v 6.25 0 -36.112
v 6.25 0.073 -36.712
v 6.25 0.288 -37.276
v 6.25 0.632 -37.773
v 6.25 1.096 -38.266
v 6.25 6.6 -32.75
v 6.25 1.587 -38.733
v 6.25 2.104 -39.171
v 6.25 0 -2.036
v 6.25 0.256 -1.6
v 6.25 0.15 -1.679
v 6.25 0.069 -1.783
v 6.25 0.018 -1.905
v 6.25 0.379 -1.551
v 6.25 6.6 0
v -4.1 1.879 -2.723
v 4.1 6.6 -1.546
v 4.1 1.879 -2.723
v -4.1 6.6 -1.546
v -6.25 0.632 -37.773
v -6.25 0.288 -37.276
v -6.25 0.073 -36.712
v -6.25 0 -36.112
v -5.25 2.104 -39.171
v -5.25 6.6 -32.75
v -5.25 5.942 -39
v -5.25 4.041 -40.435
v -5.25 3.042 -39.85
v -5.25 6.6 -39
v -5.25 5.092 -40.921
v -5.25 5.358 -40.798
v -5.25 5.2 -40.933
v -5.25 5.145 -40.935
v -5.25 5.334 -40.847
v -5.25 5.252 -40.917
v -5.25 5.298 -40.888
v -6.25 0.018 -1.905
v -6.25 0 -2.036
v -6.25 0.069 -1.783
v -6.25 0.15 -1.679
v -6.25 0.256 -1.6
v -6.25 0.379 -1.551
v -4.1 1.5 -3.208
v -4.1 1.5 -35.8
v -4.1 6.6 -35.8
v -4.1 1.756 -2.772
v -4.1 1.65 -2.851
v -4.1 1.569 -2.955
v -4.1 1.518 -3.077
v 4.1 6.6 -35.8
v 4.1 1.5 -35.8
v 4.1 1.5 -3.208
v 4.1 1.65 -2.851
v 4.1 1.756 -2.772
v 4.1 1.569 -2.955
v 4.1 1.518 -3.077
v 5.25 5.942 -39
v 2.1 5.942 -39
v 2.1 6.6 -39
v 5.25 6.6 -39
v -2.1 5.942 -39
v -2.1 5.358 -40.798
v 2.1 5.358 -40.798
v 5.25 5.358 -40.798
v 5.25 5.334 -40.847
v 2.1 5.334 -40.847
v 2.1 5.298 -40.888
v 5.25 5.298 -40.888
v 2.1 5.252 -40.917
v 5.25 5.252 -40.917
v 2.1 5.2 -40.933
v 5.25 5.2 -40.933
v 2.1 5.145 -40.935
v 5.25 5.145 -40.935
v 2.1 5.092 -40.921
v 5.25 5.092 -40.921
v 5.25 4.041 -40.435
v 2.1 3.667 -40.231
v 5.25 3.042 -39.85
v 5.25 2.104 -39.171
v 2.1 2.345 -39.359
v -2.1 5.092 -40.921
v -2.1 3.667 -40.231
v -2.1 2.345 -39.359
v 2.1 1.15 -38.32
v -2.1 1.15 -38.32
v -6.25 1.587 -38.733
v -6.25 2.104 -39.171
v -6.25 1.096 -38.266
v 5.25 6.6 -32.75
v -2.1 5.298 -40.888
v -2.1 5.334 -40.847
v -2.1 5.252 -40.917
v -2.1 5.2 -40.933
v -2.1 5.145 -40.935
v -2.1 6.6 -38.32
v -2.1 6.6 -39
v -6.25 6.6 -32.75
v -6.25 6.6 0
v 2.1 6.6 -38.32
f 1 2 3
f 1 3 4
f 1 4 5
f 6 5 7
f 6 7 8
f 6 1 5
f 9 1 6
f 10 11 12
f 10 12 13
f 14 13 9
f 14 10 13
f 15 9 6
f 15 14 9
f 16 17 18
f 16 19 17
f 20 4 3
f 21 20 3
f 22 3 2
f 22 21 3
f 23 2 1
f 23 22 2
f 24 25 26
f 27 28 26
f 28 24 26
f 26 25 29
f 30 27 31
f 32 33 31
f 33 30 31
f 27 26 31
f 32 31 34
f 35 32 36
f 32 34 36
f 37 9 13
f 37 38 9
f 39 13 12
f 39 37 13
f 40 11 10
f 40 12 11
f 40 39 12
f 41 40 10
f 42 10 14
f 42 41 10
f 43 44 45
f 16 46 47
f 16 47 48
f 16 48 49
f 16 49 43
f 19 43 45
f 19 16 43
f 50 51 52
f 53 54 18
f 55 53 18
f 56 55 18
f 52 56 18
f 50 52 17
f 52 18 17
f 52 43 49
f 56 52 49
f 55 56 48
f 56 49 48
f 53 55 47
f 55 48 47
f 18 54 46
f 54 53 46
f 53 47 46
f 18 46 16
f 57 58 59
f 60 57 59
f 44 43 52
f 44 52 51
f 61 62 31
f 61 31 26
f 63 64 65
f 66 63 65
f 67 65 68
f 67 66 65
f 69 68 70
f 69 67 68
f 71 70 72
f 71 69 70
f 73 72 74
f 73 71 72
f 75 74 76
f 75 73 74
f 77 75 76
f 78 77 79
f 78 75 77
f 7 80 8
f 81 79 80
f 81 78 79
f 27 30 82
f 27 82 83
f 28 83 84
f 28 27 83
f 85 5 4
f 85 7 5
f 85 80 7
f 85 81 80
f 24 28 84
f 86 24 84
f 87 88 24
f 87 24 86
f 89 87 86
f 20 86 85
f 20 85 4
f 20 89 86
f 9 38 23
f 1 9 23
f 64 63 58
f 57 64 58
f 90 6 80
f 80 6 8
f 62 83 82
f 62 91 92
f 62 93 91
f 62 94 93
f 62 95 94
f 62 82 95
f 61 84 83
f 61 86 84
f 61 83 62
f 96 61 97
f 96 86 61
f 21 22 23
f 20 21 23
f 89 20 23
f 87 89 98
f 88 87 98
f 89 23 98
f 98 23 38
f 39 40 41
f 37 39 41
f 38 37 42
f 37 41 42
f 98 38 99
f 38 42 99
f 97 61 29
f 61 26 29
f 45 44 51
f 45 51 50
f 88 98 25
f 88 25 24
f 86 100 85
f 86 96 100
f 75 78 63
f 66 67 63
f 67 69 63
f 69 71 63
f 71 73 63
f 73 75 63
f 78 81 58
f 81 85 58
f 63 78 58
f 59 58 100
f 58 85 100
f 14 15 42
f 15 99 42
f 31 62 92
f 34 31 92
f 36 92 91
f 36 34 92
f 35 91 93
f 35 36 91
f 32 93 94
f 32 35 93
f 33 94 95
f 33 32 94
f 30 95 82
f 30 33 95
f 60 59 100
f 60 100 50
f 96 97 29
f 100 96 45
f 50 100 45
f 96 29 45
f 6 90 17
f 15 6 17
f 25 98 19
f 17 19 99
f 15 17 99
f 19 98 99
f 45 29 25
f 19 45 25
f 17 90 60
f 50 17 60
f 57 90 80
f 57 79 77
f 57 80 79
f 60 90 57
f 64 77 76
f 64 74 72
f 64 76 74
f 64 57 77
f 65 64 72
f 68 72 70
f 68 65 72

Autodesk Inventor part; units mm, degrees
sketch "Sketch_1" plane through (0, 0, 0) normal (1, 0, 0) x (0, 1, 0)
  line L0 (6.6, 0) -> (0.379, -1.5511)
  arc A0 (0.379, -1.5511) -> (0, -2.0362) centre (0.5, -2.0362) ccw
  line L1 (0, -2.0362) -> (0, -36.1119)
  arc A1 (0, -36.1119) -> (0.6316, -37.7729) centre (2.5, -36.1119) ccw
  arc A2 (0.6316, -37.7729) -> (5.0923, -40.9212) centre (9.6, -29.8) ccw
  arc A3 (5.0923, -40.9212) -> (5.3576, -40.7976) centre (5.1674, -40.7358) ccw
  line L2 (5.3576, -40.7976) -> (5.9417, -39)
  line L3 (5.9417, -39) -> (6.6, -39)
  line L4 (6.6, -39) -> (6.6, 0)
extrude "Extrusion1" add sketch "Sketch_1" along normal mid plane 12.5
sketch "Sketch_2" plane through (0, 0, 0) normal (1, 0, 0) x (0, 1, 0)
  line L0 (6.6, -1.5459) -> (1.879, -2.723)
  arc A0 (1.879, -2.723) -> (1.5, -3.2081) centre (2, -3.2081) ccw
  line L1 (1.5, -3.2081) -> (1.5, -35.8)
  line L2 (1.5, -35.8) -> (6.6, -35.8)
  line L3 (6.6, -35.8) -> (6.6, -1.5459)
extrude "Extrusion2" cut sketch "Sketch_2" along normal mid plane 8.2
sketch "Sketch_3" plane through (6.25, 0, 0) normal (1, 0, 0) x (0, 0, -1)
  line L0 (32.75, 6.6) -> (42, 0.1231)
  line L1 (42, 0.1231) -> (42, 6.6)
  line L2 (42, 6.6) -> (32.75, 6.6)
extrude "Extrusion3" cut sketch "Sketch_3" against normal blind 1
sketch "Sketch_4" plane through (-6.25, 0, 0) normal (1, 0, 0) x (0, 0, -1)
  line L0 (32.75, 6.6) -> (42, 0.1231)
  line L1 (42, 0.1231) -> (42, 6.6)
  line L2 (42, 6.6) -> (32.75, 6.6)
extrude "Extrusion4" cut sketch "Sketch_4" along normal blind 1
sketch "Sketch_5" plane through (0, 0, 0) normal (1, 0, 0) x (0, 1, 0)
  line L0 (6.6, -38.32) -> (0, -38.32)
  line L1 (0, -38.32) -> (0, -42)
  line L2 (0, -42) -> (6.6, -42)
  line L3 (6.6, -42) -> (6.6, -38.32)
extrude "Extrusion5" cut sketch "Sketch_5" along normal mid plane 4.2
ref_plane "CP_XY" through (0, 6.6, 0) normal (0, 0, 1) x (1, 0, 0)
ref_plane "CP_YZ" through (0, 6.6, 0) normal (1, 0, 0) x (0, 1, 0)
ref_plane "CP_ZX" through (0, 6.6, 0) normal (0, 1, 0) x (0, 0, 1)
properties part number "CH20M LF OR 1103640000"
